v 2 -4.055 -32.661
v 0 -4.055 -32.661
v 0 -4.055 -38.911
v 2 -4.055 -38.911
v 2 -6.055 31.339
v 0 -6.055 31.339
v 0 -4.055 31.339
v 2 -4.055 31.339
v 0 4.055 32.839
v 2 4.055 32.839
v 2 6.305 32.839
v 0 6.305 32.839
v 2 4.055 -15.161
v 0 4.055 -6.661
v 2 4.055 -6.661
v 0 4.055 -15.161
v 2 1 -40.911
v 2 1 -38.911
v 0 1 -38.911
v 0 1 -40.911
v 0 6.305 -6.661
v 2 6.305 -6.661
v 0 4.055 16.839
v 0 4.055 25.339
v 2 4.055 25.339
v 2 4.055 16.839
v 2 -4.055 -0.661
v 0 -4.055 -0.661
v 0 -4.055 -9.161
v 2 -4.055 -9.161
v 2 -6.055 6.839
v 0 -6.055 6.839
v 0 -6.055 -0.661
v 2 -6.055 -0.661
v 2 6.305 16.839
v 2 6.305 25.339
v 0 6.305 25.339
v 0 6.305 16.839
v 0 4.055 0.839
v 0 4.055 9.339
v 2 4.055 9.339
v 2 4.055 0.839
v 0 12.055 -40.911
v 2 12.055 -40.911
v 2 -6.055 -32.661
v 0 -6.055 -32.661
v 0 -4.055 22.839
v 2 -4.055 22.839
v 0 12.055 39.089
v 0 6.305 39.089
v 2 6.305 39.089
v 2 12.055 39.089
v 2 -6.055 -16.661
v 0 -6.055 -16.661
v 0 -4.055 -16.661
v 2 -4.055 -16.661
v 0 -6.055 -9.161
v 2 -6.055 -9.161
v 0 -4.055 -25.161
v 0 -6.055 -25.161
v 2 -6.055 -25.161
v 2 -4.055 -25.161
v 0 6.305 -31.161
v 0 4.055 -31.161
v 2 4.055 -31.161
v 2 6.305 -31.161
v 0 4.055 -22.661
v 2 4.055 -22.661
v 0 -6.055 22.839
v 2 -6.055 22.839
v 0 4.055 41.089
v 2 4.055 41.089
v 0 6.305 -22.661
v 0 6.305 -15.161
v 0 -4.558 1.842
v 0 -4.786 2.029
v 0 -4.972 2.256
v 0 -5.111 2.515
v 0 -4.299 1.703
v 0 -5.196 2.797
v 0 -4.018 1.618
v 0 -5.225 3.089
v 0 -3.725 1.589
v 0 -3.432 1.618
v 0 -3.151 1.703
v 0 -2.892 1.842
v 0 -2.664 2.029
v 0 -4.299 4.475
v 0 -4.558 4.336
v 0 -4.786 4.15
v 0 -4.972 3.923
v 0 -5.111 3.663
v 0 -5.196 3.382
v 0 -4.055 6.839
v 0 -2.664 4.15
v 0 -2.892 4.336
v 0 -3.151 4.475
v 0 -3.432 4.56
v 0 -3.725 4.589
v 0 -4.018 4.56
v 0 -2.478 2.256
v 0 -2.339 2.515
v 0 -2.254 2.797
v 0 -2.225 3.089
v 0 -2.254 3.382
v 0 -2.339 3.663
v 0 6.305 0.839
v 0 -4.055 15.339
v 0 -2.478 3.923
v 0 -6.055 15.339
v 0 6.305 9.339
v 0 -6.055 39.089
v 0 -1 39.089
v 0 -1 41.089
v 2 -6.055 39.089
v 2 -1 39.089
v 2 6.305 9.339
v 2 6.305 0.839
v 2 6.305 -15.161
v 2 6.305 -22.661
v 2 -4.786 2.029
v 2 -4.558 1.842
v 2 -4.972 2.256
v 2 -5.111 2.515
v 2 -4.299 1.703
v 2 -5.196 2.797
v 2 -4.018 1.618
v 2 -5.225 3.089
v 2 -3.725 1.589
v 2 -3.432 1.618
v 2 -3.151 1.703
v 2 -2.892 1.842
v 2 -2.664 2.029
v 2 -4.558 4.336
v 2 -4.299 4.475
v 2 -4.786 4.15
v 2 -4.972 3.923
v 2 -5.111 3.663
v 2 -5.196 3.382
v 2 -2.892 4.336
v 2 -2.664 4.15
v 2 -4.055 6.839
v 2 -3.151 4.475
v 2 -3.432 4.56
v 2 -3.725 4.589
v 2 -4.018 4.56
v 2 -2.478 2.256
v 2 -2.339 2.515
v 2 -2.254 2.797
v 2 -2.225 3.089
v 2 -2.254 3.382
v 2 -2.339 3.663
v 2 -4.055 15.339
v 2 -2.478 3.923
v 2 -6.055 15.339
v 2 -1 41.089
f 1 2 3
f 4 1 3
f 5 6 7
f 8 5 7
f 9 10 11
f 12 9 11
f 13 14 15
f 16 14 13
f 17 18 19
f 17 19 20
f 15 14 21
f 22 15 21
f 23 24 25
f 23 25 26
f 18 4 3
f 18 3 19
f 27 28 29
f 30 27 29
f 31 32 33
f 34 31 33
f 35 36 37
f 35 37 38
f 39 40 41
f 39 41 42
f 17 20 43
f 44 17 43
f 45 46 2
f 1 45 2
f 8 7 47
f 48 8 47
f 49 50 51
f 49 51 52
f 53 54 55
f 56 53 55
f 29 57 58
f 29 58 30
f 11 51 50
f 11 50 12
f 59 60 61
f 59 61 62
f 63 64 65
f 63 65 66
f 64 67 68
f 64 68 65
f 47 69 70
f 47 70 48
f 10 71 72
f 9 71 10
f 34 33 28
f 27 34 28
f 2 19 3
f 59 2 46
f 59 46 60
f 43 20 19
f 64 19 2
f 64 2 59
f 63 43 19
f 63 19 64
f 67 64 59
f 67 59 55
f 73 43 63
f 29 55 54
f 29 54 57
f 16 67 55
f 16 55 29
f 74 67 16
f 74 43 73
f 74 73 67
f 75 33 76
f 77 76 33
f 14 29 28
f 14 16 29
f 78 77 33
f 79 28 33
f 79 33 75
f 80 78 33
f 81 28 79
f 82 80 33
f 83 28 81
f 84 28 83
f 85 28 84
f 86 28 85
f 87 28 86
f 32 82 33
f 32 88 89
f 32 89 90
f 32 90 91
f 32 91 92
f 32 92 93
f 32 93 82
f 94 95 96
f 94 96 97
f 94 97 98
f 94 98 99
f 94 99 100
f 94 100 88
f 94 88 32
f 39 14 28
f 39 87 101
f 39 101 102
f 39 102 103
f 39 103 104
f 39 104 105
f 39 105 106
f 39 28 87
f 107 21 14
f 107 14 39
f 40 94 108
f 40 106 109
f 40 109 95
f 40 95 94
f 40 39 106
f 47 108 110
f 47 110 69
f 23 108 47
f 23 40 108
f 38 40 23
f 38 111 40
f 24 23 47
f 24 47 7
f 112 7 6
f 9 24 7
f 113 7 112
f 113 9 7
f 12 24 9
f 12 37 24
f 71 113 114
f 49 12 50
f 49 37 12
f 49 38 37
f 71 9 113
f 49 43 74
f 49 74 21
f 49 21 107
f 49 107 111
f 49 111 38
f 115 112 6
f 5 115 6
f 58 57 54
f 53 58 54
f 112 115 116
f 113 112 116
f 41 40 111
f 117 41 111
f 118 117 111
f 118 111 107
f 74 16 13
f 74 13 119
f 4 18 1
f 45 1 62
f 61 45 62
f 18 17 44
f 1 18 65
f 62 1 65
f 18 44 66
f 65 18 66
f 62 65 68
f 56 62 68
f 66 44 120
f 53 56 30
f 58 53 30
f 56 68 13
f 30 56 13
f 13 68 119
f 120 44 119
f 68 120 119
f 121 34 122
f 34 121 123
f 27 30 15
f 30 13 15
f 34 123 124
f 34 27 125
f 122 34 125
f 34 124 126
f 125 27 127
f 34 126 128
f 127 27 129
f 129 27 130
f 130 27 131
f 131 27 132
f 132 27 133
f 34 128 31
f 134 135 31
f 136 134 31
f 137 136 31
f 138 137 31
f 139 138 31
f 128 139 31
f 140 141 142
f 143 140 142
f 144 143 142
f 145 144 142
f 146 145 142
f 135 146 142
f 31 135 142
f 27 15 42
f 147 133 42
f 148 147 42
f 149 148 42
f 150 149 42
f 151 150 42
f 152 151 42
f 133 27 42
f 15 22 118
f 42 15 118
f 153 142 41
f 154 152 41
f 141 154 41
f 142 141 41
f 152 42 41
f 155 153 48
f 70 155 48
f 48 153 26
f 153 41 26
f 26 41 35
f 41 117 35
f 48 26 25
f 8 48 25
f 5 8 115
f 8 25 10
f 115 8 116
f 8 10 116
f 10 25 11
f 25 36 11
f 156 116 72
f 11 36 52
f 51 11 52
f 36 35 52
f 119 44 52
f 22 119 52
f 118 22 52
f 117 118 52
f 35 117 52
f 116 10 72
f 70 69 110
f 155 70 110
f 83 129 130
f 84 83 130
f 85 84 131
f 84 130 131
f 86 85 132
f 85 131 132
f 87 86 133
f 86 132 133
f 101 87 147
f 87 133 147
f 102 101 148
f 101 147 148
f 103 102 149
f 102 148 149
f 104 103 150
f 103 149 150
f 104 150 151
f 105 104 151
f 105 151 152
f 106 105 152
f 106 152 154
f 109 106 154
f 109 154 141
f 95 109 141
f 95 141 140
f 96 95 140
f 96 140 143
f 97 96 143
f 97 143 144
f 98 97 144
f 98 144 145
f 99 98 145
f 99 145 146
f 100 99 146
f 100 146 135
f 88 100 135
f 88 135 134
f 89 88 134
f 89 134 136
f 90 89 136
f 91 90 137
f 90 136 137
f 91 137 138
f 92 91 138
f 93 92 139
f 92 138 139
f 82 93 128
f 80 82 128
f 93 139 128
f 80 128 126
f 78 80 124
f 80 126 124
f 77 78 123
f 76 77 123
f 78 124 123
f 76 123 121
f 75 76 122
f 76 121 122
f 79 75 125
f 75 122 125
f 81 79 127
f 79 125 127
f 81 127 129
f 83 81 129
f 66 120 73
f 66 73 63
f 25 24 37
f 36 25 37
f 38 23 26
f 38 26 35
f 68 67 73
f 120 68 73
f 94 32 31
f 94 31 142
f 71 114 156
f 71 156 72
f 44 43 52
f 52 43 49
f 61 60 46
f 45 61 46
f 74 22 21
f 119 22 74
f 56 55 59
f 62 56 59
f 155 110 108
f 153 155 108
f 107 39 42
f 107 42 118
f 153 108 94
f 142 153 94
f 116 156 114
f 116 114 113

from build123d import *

# Parameters (mm, degrees)
ESQUISSE1_W             = 82
ESQUISSE1_H             = 12.11
BOSS_EXTRU_1_DEPTH      = 2
ESQUISSE2_W             = 8.5
ESQUISSE2_H             = 2.25
ENL_V_MAT_EXTRU_1_DEPTH = 42.581069992
ESQUISSE3_W             = 8.5
ESQUISSE3_H             = 2
ENL_V_MAT_EXTRU_2_DEPTH = 42.581069992
ESQUISSE4_W             = 2
ESQUISSE4_H             = 5.055
ENL_V_MAT_EXTRU_3_DEPTH = 42.581069992
ESQUISSE5_W             = 80
ESQUISSE5_H             = 6
BOSS_EXTRU_2_DEPTH      = 2
ESQUISSE6_W             = 6.25
ESQUISSE6_H             = 0.25
ESQUISSE6_W_2           = 8.5
ENL_V_MAT_EXTRU_4_DEPTH = 43.867766231
SKETCH1_R               = 1.5
CUT_EXTRUDE1_DEPTH      = 43.867766231


with BuildPart() as part:
    # Esquisse1 → Boss.-Extru.1 (new body)
    with BuildSketch(Plane(origin=(0, 0, 0), x_dir=(0, 0, -1), z_dir=(1, 0, 0))):
        with Locations((-0.0892, 0)):
            Rectangle(ESQUISSE1_W, ESQUISSE1_H)
    extrude(amount=BOSS_EXTRU_1_DEPTH)

    # Esquisse2 → Enlèv. mat.-Extru.1 (cut, through all)
    with BuildSketch(Plane(origin=(0, 0, 0), x_dir=(0, 0, -1), z_dir=(1, 0, 0))):
        with Locations((-37.0892, 5.18)):
            Rectangle(ESQUISSE2_W, ESQUISSE2_H)
        with Locations((-21.0892, 5.18)):
            Rectangle(ESQUISSE2_W, ESQUISSE2_H)
        with Locations((-5.0892, 5.18)):
            Rectangle(ESQUISSE2_W, ESQUISSE2_H)
        with Locations((10.9108, 5.18)):
            Rectangle(ESQUISSE2_W, ESQUISSE2_H)
        with Locations((26.9108, 5.18)):
            Rectangle(ESQUISSE2_W, ESQUISSE2_H)
    extrude(amount=ENL_V_MAT_EXTRU_1_DEPTH, mode=Mode.SUBTRACT)

    # Esquisse3 → Enlèv. mat.-Extru.2 (cut, through all)
    with BuildSketch(Plane(origin=(0, 0, 0), x_dir=(0, 0, -1), z_dir=(1, 0, 0))):
        with Locations((-27.0892, -5.055)):
            Rectangle(ESQUISSE3_W, ESQUISSE3_H)
        with Locations((-11.0892, -5.055)):
            Rectangle(ESQUISSE3_W, ESQUISSE3_H)
        with Locations((4.9108, -5.055)):
            Rectangle(ESQUISSE3_W, ESQUISSE3_H)
        with Locations((20.9108, -5.055)):
            Rectangle(ESQUISSE3_W, ESQUISSE3_H)
        with Locations((36.9108, -5.055)):
            Rectangle(ESQUISSE3_W, ESQUISSE3_H)
    extrude(amount=ENL_V_MAT_EXTRU_2_DEPTH, mode=Mode.SUBTRACT)

    # Esquisse4 → Enlèv. mat.-Extru.3 (cut, through all)
    with BuildSketch(Plane(origin=(2, 0, 0), x_dir=(0, 0, -1), z_dir=(1, 0, 0))):
        with Locations((-40.0892, -3.5275)):
            Rectangle(ESQUISSE4_W, ESQUISSE4_H)
        with Locations((39.9108, -1.5275)):
            Rectangle(ESQUISSE4_W, ESQUISSE4_H)
    extrude(amount=-ENL_V_MAT_EXTRU_3_DEPTH, mode=Mode.SUBTRACT)

    # Esquisse5 → Boss.-Extru.2 (add)
    with BuildSketch(Plane.ZY):
        with Locations((-0.9108, 9.055)):
            Rectangle(ESQUISSE5_W, ESQUISSE5_H)
    extrude(amount=-BOSS_EXTRU_2_DEPTH)

    # Esquisse6 → Enlèv. mat.-Extru.4 (cut, through all)
    with BuildSketch(Plane(origin=(2, 0, 0), x_dir=(0, 0, -1), z_dir=(1, 0, 0))):
        with Locations((-35.9642, 6.18)):
            Rectangle(ESQUISSE6_W, ESQUISSE6_H)
        with Locations((-21.0892, 6.18)):
            Rectangle(ESQUISSE6_W_2, ESQUISSE6_H)
        with Locations((-5.0892, 6.18)):
            Rectangle(ESQUISSE6_W_2, ESQUISSE6_H)
        with Locations((10.9108, 6.18)):
            Rectangle(ESQUISSE6_W_2, ESQUISSE6_H)
        with Locations((26.9108, 6.18)):
            Rectangle(ESQUISSE6_W_2, ESQUISSE6_H)
    extrude(amount=-ENL_V_MAT_EXTRU_4_DEPTH, mode=Mode.SUBTRACT)

    # Sketch1 → Cut-Extrude1 (cut, through all)
    with BuildSketch(Plane(origin=(2, 0, 0), x_dir=(0, 0, -1), z_dir=(1, 0, 0))):
        with Locations((-3.0892, -3.725)):
            Circle(SKETCH1_R)
    extrude(amount=-CUT_EXTRUDE1_DEPTH, mode=Mode.SUBTRACT)


solid = part.part
